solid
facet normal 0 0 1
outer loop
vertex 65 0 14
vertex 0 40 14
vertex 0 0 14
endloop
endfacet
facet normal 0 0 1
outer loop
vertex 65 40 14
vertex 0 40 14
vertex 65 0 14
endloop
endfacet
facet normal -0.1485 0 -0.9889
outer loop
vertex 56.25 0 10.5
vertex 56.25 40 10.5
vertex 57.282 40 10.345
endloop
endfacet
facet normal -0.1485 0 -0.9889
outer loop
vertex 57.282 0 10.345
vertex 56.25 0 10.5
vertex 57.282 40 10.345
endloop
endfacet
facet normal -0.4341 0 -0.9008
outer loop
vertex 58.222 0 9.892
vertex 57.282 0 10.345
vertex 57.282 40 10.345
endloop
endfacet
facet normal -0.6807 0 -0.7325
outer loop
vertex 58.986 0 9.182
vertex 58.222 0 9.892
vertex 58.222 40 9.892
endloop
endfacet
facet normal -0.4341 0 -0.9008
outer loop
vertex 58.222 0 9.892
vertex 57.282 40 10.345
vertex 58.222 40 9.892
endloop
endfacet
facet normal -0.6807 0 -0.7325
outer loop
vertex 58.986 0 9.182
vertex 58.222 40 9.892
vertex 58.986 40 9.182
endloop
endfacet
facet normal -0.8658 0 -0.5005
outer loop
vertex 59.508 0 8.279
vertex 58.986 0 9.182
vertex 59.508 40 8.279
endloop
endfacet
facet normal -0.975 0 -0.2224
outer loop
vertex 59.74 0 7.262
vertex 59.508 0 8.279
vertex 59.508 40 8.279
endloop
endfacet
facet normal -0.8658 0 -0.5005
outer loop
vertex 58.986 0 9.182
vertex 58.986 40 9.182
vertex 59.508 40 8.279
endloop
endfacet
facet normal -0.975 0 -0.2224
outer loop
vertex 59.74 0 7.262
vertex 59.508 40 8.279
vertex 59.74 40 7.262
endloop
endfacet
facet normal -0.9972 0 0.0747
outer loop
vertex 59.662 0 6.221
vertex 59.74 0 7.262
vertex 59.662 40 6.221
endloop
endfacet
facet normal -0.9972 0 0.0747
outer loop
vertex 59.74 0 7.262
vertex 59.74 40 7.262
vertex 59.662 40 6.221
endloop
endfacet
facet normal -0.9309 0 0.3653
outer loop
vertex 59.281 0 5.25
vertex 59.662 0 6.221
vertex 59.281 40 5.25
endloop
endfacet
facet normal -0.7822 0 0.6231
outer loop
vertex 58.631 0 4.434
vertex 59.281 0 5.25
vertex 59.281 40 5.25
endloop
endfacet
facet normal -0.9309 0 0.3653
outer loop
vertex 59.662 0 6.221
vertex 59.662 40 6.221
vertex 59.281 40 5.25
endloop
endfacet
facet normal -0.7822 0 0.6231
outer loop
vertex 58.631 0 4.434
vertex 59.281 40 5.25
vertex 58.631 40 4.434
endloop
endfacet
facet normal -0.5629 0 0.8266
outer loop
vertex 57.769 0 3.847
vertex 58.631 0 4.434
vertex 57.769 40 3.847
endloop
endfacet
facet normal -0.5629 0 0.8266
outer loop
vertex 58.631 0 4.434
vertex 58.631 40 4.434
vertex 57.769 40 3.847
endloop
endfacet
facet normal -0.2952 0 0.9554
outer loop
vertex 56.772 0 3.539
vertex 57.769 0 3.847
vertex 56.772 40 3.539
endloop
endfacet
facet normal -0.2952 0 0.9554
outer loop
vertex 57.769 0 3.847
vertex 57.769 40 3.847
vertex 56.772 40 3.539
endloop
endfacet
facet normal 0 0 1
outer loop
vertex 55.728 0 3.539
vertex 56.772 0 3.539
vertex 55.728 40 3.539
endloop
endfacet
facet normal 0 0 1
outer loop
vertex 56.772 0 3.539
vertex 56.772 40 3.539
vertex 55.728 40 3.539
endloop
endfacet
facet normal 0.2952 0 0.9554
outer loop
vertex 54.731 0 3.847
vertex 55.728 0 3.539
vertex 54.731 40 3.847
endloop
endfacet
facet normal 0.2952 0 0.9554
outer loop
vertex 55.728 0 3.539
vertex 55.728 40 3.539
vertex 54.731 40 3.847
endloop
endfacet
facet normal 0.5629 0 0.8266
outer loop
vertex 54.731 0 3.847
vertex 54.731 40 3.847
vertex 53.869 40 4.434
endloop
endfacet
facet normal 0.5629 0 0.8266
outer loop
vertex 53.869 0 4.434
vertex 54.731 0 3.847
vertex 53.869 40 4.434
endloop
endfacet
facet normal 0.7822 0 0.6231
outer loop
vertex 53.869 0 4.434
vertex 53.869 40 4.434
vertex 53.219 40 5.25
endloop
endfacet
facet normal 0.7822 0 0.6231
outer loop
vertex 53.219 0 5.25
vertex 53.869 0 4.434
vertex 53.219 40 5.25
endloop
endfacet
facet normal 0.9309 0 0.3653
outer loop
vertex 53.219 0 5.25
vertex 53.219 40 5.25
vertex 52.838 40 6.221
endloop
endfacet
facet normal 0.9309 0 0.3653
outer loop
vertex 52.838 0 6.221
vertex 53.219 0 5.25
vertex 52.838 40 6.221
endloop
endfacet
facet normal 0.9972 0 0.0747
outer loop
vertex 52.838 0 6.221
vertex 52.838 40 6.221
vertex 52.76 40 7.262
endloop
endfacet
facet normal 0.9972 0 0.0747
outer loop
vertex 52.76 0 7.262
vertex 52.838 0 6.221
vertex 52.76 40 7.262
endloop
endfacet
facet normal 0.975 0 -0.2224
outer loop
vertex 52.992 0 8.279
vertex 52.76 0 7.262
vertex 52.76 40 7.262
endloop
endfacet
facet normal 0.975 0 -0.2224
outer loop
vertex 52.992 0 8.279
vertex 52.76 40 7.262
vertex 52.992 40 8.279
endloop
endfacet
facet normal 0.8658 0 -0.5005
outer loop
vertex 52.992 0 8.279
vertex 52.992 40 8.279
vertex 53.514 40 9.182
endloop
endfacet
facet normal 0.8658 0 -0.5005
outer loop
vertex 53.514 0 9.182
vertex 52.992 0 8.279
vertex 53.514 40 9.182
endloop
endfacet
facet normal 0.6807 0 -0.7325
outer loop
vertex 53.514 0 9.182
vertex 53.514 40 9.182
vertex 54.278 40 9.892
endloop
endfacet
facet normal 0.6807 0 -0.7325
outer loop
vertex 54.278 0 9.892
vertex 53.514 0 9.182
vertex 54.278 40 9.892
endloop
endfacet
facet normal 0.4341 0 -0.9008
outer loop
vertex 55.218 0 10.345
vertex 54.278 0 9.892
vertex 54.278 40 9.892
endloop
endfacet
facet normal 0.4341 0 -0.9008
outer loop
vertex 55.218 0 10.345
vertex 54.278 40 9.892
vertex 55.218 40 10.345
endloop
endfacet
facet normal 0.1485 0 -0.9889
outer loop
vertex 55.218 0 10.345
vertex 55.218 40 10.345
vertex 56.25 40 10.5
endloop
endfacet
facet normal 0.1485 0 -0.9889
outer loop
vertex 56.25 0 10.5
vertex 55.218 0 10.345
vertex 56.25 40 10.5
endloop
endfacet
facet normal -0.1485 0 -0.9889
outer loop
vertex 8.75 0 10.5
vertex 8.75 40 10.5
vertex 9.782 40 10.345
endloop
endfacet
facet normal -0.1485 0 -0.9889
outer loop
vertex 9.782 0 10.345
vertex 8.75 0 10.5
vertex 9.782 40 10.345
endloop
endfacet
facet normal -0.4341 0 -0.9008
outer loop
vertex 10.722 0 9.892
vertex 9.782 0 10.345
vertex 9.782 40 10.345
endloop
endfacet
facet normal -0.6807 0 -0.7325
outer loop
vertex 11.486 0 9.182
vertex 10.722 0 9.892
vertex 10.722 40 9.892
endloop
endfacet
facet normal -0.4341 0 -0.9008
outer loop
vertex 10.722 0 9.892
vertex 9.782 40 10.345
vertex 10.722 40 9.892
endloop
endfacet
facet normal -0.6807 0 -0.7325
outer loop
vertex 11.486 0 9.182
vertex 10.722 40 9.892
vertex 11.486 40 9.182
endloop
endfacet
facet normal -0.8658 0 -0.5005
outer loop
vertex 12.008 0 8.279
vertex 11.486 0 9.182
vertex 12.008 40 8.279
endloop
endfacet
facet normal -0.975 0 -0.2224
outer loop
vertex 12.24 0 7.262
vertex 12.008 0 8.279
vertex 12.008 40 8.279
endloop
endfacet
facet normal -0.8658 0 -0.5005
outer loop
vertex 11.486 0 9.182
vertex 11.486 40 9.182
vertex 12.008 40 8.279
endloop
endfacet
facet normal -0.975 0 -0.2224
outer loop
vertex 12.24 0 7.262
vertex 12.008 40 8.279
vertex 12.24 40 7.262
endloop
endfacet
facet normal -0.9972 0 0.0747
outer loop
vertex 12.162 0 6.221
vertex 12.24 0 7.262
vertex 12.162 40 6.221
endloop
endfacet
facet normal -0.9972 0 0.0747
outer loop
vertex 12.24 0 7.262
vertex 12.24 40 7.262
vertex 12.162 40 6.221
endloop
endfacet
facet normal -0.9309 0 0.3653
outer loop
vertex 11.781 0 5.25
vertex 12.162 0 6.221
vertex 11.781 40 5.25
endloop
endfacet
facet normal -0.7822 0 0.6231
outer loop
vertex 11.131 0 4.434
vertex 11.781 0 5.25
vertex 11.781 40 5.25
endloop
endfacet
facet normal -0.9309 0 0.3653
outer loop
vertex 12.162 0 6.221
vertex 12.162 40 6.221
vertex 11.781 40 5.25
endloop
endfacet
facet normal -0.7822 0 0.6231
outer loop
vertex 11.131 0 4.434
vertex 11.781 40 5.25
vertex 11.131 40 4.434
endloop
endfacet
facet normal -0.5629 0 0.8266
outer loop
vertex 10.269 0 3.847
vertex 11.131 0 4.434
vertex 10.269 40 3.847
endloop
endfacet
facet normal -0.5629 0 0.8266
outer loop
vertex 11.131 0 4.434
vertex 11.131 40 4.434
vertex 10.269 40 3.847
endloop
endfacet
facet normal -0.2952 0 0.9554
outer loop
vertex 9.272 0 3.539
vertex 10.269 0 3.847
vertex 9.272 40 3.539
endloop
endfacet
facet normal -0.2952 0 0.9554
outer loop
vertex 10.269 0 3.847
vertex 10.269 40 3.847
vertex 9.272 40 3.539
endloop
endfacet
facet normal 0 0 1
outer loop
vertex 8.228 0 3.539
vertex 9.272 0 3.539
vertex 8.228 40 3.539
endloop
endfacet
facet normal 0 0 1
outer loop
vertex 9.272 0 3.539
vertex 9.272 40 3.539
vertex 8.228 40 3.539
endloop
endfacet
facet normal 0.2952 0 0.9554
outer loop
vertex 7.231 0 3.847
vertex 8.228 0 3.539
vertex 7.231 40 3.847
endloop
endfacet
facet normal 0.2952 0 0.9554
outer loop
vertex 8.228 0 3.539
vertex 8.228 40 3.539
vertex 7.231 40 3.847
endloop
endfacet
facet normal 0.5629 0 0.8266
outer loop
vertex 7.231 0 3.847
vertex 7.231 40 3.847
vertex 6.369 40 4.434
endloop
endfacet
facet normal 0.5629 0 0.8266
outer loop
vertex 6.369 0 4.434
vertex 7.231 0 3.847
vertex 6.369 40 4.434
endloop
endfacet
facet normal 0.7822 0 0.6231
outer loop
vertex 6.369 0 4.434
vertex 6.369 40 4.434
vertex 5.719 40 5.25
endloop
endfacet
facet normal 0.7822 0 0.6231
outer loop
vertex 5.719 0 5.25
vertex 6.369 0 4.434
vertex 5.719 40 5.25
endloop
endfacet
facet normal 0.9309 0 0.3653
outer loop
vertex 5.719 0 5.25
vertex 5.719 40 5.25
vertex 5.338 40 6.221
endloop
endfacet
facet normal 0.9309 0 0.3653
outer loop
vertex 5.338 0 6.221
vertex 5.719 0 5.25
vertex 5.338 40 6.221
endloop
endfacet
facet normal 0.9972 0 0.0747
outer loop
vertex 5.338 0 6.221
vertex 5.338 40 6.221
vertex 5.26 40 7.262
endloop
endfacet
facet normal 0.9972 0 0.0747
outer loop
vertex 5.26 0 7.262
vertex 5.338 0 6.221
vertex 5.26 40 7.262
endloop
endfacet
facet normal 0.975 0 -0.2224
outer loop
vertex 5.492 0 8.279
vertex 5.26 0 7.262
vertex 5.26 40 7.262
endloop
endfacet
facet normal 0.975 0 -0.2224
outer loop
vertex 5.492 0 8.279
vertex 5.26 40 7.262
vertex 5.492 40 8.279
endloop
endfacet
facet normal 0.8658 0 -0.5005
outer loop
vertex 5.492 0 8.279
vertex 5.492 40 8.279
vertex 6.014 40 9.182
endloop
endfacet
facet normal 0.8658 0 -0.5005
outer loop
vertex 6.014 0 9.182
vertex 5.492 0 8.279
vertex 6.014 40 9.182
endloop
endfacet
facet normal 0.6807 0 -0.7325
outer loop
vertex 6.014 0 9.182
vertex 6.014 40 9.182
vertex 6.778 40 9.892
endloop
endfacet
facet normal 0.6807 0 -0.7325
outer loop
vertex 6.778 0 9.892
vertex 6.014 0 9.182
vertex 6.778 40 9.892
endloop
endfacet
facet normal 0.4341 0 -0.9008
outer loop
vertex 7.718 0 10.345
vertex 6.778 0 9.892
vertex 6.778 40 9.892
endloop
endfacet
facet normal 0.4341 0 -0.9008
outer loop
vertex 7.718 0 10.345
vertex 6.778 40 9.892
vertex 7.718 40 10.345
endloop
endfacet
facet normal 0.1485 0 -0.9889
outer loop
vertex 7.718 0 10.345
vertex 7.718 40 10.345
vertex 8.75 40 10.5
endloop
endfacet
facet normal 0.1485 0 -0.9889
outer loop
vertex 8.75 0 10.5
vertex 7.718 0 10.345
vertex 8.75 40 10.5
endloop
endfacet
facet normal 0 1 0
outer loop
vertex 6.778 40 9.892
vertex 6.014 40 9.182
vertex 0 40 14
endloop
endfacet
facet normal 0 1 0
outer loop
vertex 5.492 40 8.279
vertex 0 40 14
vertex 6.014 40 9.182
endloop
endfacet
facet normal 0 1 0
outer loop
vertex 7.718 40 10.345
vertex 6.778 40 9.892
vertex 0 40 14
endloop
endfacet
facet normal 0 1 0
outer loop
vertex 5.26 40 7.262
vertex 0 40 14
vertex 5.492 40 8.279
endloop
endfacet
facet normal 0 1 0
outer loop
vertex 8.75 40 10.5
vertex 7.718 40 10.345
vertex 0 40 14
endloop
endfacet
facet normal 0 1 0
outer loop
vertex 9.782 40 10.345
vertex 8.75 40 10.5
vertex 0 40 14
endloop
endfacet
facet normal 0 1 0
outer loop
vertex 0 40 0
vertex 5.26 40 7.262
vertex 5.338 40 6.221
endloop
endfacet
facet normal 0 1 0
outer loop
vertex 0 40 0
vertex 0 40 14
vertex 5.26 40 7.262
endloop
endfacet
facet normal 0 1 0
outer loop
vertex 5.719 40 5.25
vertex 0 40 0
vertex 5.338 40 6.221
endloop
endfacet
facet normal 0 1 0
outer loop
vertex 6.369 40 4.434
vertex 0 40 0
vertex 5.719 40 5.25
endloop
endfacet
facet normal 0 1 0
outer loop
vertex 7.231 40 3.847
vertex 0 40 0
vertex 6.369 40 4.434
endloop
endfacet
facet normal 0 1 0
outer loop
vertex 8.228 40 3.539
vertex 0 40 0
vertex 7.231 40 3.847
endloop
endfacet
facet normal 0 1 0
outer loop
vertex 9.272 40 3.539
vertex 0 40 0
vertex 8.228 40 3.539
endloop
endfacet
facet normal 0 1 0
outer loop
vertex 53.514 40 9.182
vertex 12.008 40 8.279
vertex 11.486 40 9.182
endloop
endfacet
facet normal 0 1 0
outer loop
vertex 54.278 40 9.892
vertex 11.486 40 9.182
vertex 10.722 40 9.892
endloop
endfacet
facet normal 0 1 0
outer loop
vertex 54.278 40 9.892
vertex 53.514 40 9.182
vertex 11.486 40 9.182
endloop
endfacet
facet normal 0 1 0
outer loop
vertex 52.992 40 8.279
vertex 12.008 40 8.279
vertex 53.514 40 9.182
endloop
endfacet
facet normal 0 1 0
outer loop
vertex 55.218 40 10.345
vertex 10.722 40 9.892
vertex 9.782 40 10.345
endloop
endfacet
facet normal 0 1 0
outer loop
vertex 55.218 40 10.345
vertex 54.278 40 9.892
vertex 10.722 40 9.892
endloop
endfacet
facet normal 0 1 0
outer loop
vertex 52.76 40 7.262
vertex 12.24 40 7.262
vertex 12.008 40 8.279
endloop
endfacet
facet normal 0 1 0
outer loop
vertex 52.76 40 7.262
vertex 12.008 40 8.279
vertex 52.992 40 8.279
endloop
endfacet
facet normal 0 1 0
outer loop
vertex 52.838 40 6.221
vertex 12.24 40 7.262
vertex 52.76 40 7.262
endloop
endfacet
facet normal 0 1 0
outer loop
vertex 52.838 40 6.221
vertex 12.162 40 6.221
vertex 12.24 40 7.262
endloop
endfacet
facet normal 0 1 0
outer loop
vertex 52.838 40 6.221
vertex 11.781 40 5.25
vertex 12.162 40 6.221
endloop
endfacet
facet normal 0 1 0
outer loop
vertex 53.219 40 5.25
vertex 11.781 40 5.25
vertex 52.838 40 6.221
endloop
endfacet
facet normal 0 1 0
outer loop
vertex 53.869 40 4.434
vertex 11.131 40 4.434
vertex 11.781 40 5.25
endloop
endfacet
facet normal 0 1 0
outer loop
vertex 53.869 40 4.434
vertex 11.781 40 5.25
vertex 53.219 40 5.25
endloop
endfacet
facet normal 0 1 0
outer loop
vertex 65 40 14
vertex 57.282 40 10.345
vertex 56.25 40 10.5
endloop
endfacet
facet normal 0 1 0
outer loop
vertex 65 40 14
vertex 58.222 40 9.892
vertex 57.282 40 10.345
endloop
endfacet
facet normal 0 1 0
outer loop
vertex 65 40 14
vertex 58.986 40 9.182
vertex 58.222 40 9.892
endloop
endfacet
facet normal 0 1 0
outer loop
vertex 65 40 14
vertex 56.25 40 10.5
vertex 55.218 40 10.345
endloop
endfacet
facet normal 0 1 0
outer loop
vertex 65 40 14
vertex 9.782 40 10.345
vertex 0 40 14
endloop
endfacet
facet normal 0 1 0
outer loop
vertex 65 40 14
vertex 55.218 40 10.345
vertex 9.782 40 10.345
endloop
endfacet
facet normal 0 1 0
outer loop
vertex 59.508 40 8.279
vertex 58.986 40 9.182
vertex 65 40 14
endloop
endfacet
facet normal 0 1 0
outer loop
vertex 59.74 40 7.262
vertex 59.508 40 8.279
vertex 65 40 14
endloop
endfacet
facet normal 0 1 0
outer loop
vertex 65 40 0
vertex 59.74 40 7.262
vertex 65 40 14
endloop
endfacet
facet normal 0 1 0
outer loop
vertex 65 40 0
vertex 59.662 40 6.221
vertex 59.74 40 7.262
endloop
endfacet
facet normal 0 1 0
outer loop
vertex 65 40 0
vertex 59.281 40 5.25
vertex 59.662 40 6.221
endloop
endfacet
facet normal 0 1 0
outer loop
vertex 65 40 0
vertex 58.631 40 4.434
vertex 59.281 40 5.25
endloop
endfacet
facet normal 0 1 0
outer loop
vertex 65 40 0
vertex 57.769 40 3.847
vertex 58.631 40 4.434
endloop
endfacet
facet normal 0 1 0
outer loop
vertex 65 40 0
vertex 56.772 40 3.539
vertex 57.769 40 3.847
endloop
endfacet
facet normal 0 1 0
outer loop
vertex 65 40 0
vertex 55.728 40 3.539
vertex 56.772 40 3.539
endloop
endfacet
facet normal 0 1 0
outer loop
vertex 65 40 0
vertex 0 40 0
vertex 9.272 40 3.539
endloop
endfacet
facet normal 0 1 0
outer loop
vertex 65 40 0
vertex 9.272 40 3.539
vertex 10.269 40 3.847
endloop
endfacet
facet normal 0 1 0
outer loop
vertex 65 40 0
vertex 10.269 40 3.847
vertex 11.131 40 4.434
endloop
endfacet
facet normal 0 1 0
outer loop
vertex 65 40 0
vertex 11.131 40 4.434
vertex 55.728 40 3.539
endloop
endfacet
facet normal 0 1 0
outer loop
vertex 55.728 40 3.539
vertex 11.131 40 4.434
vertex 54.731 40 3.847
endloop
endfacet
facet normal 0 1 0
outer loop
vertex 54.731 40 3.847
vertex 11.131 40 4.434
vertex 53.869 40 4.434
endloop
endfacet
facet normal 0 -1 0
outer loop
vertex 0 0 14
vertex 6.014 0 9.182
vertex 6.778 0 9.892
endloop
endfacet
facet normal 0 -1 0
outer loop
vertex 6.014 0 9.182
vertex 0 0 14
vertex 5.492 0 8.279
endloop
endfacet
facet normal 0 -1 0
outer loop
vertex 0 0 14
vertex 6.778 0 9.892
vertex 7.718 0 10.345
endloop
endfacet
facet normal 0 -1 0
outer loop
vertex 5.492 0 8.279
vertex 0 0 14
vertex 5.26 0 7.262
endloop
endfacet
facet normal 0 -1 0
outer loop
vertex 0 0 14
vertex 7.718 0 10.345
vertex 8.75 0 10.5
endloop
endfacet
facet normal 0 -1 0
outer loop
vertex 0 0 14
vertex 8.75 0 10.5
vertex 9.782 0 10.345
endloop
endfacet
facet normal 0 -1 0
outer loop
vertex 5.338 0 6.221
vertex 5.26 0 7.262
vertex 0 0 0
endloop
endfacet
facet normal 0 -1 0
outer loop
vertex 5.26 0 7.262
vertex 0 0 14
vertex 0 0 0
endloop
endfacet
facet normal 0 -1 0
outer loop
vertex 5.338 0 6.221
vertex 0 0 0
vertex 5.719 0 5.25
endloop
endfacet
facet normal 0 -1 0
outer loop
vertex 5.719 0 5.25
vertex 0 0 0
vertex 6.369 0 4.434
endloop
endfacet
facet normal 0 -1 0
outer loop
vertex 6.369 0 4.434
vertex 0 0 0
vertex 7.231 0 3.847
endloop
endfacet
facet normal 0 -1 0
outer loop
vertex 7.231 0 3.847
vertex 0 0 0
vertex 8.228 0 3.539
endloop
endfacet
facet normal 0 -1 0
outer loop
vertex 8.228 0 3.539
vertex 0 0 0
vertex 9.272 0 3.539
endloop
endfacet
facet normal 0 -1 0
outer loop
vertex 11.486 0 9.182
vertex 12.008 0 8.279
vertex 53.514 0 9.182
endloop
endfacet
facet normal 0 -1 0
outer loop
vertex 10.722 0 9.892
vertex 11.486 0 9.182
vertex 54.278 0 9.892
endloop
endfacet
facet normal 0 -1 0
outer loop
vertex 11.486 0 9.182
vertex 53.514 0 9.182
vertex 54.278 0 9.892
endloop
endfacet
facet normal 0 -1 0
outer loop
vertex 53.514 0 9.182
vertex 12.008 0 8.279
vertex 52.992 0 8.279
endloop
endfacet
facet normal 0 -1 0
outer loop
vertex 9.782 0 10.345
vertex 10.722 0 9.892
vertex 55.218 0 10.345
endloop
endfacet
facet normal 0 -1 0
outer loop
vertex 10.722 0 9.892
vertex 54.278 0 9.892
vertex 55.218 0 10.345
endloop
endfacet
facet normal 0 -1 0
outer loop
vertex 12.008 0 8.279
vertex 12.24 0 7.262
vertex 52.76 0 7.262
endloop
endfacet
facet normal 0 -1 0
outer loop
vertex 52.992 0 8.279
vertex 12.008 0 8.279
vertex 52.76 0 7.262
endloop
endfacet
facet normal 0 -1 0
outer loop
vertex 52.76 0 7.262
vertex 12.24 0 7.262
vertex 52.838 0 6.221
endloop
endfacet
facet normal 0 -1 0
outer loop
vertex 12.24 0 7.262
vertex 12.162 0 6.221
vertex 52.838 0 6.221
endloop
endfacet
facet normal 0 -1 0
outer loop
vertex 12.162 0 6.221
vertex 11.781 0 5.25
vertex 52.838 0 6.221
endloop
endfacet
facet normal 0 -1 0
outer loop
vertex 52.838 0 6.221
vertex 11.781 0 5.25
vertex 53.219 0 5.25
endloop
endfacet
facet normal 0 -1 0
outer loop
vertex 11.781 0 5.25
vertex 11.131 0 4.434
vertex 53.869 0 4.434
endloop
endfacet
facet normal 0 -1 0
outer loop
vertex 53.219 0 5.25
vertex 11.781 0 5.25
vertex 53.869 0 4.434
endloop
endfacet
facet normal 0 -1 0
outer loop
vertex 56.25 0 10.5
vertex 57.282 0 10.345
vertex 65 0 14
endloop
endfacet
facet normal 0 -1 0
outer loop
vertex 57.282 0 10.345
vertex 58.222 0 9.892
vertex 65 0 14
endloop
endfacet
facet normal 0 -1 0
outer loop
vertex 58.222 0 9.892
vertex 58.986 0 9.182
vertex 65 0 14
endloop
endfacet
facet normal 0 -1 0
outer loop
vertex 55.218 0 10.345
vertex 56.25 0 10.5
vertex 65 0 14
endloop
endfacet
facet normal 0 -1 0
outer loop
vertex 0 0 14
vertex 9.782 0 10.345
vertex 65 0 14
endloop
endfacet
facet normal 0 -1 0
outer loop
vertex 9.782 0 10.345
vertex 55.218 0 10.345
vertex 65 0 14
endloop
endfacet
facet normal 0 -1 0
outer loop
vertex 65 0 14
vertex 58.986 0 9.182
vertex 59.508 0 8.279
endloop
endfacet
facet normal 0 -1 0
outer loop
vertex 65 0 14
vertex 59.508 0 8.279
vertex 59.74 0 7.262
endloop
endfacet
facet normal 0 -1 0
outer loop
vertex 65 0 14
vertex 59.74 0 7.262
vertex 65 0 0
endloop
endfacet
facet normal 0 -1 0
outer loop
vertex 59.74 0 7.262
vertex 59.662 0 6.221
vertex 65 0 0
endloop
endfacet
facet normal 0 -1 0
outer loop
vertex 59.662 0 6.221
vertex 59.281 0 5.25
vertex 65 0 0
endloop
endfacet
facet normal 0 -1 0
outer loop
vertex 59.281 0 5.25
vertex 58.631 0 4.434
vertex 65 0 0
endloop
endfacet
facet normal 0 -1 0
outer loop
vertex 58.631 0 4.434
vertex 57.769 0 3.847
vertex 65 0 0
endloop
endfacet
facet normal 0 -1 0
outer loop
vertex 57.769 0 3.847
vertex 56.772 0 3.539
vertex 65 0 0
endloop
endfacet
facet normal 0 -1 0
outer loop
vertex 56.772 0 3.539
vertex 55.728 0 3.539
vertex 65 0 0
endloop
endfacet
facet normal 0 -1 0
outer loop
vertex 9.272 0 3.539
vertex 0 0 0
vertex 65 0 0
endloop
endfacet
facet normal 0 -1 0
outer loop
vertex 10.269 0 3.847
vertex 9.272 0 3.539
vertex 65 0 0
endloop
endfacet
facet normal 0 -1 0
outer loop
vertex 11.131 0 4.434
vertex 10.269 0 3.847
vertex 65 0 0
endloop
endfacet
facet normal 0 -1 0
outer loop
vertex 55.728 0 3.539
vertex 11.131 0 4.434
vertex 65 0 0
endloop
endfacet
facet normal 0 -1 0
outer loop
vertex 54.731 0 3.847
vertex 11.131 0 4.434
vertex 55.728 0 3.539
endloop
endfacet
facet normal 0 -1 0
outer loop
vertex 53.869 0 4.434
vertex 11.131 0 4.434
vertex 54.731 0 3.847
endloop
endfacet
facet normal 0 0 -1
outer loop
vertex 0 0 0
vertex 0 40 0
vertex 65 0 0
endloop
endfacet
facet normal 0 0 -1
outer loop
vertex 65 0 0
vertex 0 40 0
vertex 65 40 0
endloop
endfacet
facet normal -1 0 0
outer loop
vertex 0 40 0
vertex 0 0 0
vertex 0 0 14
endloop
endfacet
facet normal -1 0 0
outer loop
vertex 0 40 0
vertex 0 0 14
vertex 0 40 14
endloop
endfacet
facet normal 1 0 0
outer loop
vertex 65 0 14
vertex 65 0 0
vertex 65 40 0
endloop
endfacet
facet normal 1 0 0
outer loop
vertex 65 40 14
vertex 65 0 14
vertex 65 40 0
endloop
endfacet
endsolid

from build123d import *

# Parameters (mm, degrees)
SKETCH1_W      = 65
SKETCH1_H      = 40
EXTRUDE1_DEPTH = 14
SKETCH2_R      = 3.5
EXTRUDE2_DEPTH = 41


with BuildPart() as part:
    # Sketch1 → Extrude1 (new body)
    with BuildSketch(Plane.XY):
        with Locations((32.5, 20)):
            Rectangle(SKETCH1_W, SKETCH1_H)
    extrude(amount=EXTRUDE1_DEPTH)

    # Sketch2 → Extrude2 (cut, through all)
    with BuildSketch(Plane(origin=(0, 40, 0), x_dir=(1, 0, 0), z_dir=(0, 1, 0))):
        with Locations(Location((8.75, -7, 0), (0, 0, 270))):  # turned: the seam where the file's is
            Circle(SKETCH2_R)
        with Locations(Location((56.25, -7, 0), (0, 0, 270))):  # turned: the seam where the file's is
            Circle(SKETCH2_R)
    extrude(amount=-EXTRUDE2_DEPTH, mode=Mode.SUBTRACT)


solid = part.part
